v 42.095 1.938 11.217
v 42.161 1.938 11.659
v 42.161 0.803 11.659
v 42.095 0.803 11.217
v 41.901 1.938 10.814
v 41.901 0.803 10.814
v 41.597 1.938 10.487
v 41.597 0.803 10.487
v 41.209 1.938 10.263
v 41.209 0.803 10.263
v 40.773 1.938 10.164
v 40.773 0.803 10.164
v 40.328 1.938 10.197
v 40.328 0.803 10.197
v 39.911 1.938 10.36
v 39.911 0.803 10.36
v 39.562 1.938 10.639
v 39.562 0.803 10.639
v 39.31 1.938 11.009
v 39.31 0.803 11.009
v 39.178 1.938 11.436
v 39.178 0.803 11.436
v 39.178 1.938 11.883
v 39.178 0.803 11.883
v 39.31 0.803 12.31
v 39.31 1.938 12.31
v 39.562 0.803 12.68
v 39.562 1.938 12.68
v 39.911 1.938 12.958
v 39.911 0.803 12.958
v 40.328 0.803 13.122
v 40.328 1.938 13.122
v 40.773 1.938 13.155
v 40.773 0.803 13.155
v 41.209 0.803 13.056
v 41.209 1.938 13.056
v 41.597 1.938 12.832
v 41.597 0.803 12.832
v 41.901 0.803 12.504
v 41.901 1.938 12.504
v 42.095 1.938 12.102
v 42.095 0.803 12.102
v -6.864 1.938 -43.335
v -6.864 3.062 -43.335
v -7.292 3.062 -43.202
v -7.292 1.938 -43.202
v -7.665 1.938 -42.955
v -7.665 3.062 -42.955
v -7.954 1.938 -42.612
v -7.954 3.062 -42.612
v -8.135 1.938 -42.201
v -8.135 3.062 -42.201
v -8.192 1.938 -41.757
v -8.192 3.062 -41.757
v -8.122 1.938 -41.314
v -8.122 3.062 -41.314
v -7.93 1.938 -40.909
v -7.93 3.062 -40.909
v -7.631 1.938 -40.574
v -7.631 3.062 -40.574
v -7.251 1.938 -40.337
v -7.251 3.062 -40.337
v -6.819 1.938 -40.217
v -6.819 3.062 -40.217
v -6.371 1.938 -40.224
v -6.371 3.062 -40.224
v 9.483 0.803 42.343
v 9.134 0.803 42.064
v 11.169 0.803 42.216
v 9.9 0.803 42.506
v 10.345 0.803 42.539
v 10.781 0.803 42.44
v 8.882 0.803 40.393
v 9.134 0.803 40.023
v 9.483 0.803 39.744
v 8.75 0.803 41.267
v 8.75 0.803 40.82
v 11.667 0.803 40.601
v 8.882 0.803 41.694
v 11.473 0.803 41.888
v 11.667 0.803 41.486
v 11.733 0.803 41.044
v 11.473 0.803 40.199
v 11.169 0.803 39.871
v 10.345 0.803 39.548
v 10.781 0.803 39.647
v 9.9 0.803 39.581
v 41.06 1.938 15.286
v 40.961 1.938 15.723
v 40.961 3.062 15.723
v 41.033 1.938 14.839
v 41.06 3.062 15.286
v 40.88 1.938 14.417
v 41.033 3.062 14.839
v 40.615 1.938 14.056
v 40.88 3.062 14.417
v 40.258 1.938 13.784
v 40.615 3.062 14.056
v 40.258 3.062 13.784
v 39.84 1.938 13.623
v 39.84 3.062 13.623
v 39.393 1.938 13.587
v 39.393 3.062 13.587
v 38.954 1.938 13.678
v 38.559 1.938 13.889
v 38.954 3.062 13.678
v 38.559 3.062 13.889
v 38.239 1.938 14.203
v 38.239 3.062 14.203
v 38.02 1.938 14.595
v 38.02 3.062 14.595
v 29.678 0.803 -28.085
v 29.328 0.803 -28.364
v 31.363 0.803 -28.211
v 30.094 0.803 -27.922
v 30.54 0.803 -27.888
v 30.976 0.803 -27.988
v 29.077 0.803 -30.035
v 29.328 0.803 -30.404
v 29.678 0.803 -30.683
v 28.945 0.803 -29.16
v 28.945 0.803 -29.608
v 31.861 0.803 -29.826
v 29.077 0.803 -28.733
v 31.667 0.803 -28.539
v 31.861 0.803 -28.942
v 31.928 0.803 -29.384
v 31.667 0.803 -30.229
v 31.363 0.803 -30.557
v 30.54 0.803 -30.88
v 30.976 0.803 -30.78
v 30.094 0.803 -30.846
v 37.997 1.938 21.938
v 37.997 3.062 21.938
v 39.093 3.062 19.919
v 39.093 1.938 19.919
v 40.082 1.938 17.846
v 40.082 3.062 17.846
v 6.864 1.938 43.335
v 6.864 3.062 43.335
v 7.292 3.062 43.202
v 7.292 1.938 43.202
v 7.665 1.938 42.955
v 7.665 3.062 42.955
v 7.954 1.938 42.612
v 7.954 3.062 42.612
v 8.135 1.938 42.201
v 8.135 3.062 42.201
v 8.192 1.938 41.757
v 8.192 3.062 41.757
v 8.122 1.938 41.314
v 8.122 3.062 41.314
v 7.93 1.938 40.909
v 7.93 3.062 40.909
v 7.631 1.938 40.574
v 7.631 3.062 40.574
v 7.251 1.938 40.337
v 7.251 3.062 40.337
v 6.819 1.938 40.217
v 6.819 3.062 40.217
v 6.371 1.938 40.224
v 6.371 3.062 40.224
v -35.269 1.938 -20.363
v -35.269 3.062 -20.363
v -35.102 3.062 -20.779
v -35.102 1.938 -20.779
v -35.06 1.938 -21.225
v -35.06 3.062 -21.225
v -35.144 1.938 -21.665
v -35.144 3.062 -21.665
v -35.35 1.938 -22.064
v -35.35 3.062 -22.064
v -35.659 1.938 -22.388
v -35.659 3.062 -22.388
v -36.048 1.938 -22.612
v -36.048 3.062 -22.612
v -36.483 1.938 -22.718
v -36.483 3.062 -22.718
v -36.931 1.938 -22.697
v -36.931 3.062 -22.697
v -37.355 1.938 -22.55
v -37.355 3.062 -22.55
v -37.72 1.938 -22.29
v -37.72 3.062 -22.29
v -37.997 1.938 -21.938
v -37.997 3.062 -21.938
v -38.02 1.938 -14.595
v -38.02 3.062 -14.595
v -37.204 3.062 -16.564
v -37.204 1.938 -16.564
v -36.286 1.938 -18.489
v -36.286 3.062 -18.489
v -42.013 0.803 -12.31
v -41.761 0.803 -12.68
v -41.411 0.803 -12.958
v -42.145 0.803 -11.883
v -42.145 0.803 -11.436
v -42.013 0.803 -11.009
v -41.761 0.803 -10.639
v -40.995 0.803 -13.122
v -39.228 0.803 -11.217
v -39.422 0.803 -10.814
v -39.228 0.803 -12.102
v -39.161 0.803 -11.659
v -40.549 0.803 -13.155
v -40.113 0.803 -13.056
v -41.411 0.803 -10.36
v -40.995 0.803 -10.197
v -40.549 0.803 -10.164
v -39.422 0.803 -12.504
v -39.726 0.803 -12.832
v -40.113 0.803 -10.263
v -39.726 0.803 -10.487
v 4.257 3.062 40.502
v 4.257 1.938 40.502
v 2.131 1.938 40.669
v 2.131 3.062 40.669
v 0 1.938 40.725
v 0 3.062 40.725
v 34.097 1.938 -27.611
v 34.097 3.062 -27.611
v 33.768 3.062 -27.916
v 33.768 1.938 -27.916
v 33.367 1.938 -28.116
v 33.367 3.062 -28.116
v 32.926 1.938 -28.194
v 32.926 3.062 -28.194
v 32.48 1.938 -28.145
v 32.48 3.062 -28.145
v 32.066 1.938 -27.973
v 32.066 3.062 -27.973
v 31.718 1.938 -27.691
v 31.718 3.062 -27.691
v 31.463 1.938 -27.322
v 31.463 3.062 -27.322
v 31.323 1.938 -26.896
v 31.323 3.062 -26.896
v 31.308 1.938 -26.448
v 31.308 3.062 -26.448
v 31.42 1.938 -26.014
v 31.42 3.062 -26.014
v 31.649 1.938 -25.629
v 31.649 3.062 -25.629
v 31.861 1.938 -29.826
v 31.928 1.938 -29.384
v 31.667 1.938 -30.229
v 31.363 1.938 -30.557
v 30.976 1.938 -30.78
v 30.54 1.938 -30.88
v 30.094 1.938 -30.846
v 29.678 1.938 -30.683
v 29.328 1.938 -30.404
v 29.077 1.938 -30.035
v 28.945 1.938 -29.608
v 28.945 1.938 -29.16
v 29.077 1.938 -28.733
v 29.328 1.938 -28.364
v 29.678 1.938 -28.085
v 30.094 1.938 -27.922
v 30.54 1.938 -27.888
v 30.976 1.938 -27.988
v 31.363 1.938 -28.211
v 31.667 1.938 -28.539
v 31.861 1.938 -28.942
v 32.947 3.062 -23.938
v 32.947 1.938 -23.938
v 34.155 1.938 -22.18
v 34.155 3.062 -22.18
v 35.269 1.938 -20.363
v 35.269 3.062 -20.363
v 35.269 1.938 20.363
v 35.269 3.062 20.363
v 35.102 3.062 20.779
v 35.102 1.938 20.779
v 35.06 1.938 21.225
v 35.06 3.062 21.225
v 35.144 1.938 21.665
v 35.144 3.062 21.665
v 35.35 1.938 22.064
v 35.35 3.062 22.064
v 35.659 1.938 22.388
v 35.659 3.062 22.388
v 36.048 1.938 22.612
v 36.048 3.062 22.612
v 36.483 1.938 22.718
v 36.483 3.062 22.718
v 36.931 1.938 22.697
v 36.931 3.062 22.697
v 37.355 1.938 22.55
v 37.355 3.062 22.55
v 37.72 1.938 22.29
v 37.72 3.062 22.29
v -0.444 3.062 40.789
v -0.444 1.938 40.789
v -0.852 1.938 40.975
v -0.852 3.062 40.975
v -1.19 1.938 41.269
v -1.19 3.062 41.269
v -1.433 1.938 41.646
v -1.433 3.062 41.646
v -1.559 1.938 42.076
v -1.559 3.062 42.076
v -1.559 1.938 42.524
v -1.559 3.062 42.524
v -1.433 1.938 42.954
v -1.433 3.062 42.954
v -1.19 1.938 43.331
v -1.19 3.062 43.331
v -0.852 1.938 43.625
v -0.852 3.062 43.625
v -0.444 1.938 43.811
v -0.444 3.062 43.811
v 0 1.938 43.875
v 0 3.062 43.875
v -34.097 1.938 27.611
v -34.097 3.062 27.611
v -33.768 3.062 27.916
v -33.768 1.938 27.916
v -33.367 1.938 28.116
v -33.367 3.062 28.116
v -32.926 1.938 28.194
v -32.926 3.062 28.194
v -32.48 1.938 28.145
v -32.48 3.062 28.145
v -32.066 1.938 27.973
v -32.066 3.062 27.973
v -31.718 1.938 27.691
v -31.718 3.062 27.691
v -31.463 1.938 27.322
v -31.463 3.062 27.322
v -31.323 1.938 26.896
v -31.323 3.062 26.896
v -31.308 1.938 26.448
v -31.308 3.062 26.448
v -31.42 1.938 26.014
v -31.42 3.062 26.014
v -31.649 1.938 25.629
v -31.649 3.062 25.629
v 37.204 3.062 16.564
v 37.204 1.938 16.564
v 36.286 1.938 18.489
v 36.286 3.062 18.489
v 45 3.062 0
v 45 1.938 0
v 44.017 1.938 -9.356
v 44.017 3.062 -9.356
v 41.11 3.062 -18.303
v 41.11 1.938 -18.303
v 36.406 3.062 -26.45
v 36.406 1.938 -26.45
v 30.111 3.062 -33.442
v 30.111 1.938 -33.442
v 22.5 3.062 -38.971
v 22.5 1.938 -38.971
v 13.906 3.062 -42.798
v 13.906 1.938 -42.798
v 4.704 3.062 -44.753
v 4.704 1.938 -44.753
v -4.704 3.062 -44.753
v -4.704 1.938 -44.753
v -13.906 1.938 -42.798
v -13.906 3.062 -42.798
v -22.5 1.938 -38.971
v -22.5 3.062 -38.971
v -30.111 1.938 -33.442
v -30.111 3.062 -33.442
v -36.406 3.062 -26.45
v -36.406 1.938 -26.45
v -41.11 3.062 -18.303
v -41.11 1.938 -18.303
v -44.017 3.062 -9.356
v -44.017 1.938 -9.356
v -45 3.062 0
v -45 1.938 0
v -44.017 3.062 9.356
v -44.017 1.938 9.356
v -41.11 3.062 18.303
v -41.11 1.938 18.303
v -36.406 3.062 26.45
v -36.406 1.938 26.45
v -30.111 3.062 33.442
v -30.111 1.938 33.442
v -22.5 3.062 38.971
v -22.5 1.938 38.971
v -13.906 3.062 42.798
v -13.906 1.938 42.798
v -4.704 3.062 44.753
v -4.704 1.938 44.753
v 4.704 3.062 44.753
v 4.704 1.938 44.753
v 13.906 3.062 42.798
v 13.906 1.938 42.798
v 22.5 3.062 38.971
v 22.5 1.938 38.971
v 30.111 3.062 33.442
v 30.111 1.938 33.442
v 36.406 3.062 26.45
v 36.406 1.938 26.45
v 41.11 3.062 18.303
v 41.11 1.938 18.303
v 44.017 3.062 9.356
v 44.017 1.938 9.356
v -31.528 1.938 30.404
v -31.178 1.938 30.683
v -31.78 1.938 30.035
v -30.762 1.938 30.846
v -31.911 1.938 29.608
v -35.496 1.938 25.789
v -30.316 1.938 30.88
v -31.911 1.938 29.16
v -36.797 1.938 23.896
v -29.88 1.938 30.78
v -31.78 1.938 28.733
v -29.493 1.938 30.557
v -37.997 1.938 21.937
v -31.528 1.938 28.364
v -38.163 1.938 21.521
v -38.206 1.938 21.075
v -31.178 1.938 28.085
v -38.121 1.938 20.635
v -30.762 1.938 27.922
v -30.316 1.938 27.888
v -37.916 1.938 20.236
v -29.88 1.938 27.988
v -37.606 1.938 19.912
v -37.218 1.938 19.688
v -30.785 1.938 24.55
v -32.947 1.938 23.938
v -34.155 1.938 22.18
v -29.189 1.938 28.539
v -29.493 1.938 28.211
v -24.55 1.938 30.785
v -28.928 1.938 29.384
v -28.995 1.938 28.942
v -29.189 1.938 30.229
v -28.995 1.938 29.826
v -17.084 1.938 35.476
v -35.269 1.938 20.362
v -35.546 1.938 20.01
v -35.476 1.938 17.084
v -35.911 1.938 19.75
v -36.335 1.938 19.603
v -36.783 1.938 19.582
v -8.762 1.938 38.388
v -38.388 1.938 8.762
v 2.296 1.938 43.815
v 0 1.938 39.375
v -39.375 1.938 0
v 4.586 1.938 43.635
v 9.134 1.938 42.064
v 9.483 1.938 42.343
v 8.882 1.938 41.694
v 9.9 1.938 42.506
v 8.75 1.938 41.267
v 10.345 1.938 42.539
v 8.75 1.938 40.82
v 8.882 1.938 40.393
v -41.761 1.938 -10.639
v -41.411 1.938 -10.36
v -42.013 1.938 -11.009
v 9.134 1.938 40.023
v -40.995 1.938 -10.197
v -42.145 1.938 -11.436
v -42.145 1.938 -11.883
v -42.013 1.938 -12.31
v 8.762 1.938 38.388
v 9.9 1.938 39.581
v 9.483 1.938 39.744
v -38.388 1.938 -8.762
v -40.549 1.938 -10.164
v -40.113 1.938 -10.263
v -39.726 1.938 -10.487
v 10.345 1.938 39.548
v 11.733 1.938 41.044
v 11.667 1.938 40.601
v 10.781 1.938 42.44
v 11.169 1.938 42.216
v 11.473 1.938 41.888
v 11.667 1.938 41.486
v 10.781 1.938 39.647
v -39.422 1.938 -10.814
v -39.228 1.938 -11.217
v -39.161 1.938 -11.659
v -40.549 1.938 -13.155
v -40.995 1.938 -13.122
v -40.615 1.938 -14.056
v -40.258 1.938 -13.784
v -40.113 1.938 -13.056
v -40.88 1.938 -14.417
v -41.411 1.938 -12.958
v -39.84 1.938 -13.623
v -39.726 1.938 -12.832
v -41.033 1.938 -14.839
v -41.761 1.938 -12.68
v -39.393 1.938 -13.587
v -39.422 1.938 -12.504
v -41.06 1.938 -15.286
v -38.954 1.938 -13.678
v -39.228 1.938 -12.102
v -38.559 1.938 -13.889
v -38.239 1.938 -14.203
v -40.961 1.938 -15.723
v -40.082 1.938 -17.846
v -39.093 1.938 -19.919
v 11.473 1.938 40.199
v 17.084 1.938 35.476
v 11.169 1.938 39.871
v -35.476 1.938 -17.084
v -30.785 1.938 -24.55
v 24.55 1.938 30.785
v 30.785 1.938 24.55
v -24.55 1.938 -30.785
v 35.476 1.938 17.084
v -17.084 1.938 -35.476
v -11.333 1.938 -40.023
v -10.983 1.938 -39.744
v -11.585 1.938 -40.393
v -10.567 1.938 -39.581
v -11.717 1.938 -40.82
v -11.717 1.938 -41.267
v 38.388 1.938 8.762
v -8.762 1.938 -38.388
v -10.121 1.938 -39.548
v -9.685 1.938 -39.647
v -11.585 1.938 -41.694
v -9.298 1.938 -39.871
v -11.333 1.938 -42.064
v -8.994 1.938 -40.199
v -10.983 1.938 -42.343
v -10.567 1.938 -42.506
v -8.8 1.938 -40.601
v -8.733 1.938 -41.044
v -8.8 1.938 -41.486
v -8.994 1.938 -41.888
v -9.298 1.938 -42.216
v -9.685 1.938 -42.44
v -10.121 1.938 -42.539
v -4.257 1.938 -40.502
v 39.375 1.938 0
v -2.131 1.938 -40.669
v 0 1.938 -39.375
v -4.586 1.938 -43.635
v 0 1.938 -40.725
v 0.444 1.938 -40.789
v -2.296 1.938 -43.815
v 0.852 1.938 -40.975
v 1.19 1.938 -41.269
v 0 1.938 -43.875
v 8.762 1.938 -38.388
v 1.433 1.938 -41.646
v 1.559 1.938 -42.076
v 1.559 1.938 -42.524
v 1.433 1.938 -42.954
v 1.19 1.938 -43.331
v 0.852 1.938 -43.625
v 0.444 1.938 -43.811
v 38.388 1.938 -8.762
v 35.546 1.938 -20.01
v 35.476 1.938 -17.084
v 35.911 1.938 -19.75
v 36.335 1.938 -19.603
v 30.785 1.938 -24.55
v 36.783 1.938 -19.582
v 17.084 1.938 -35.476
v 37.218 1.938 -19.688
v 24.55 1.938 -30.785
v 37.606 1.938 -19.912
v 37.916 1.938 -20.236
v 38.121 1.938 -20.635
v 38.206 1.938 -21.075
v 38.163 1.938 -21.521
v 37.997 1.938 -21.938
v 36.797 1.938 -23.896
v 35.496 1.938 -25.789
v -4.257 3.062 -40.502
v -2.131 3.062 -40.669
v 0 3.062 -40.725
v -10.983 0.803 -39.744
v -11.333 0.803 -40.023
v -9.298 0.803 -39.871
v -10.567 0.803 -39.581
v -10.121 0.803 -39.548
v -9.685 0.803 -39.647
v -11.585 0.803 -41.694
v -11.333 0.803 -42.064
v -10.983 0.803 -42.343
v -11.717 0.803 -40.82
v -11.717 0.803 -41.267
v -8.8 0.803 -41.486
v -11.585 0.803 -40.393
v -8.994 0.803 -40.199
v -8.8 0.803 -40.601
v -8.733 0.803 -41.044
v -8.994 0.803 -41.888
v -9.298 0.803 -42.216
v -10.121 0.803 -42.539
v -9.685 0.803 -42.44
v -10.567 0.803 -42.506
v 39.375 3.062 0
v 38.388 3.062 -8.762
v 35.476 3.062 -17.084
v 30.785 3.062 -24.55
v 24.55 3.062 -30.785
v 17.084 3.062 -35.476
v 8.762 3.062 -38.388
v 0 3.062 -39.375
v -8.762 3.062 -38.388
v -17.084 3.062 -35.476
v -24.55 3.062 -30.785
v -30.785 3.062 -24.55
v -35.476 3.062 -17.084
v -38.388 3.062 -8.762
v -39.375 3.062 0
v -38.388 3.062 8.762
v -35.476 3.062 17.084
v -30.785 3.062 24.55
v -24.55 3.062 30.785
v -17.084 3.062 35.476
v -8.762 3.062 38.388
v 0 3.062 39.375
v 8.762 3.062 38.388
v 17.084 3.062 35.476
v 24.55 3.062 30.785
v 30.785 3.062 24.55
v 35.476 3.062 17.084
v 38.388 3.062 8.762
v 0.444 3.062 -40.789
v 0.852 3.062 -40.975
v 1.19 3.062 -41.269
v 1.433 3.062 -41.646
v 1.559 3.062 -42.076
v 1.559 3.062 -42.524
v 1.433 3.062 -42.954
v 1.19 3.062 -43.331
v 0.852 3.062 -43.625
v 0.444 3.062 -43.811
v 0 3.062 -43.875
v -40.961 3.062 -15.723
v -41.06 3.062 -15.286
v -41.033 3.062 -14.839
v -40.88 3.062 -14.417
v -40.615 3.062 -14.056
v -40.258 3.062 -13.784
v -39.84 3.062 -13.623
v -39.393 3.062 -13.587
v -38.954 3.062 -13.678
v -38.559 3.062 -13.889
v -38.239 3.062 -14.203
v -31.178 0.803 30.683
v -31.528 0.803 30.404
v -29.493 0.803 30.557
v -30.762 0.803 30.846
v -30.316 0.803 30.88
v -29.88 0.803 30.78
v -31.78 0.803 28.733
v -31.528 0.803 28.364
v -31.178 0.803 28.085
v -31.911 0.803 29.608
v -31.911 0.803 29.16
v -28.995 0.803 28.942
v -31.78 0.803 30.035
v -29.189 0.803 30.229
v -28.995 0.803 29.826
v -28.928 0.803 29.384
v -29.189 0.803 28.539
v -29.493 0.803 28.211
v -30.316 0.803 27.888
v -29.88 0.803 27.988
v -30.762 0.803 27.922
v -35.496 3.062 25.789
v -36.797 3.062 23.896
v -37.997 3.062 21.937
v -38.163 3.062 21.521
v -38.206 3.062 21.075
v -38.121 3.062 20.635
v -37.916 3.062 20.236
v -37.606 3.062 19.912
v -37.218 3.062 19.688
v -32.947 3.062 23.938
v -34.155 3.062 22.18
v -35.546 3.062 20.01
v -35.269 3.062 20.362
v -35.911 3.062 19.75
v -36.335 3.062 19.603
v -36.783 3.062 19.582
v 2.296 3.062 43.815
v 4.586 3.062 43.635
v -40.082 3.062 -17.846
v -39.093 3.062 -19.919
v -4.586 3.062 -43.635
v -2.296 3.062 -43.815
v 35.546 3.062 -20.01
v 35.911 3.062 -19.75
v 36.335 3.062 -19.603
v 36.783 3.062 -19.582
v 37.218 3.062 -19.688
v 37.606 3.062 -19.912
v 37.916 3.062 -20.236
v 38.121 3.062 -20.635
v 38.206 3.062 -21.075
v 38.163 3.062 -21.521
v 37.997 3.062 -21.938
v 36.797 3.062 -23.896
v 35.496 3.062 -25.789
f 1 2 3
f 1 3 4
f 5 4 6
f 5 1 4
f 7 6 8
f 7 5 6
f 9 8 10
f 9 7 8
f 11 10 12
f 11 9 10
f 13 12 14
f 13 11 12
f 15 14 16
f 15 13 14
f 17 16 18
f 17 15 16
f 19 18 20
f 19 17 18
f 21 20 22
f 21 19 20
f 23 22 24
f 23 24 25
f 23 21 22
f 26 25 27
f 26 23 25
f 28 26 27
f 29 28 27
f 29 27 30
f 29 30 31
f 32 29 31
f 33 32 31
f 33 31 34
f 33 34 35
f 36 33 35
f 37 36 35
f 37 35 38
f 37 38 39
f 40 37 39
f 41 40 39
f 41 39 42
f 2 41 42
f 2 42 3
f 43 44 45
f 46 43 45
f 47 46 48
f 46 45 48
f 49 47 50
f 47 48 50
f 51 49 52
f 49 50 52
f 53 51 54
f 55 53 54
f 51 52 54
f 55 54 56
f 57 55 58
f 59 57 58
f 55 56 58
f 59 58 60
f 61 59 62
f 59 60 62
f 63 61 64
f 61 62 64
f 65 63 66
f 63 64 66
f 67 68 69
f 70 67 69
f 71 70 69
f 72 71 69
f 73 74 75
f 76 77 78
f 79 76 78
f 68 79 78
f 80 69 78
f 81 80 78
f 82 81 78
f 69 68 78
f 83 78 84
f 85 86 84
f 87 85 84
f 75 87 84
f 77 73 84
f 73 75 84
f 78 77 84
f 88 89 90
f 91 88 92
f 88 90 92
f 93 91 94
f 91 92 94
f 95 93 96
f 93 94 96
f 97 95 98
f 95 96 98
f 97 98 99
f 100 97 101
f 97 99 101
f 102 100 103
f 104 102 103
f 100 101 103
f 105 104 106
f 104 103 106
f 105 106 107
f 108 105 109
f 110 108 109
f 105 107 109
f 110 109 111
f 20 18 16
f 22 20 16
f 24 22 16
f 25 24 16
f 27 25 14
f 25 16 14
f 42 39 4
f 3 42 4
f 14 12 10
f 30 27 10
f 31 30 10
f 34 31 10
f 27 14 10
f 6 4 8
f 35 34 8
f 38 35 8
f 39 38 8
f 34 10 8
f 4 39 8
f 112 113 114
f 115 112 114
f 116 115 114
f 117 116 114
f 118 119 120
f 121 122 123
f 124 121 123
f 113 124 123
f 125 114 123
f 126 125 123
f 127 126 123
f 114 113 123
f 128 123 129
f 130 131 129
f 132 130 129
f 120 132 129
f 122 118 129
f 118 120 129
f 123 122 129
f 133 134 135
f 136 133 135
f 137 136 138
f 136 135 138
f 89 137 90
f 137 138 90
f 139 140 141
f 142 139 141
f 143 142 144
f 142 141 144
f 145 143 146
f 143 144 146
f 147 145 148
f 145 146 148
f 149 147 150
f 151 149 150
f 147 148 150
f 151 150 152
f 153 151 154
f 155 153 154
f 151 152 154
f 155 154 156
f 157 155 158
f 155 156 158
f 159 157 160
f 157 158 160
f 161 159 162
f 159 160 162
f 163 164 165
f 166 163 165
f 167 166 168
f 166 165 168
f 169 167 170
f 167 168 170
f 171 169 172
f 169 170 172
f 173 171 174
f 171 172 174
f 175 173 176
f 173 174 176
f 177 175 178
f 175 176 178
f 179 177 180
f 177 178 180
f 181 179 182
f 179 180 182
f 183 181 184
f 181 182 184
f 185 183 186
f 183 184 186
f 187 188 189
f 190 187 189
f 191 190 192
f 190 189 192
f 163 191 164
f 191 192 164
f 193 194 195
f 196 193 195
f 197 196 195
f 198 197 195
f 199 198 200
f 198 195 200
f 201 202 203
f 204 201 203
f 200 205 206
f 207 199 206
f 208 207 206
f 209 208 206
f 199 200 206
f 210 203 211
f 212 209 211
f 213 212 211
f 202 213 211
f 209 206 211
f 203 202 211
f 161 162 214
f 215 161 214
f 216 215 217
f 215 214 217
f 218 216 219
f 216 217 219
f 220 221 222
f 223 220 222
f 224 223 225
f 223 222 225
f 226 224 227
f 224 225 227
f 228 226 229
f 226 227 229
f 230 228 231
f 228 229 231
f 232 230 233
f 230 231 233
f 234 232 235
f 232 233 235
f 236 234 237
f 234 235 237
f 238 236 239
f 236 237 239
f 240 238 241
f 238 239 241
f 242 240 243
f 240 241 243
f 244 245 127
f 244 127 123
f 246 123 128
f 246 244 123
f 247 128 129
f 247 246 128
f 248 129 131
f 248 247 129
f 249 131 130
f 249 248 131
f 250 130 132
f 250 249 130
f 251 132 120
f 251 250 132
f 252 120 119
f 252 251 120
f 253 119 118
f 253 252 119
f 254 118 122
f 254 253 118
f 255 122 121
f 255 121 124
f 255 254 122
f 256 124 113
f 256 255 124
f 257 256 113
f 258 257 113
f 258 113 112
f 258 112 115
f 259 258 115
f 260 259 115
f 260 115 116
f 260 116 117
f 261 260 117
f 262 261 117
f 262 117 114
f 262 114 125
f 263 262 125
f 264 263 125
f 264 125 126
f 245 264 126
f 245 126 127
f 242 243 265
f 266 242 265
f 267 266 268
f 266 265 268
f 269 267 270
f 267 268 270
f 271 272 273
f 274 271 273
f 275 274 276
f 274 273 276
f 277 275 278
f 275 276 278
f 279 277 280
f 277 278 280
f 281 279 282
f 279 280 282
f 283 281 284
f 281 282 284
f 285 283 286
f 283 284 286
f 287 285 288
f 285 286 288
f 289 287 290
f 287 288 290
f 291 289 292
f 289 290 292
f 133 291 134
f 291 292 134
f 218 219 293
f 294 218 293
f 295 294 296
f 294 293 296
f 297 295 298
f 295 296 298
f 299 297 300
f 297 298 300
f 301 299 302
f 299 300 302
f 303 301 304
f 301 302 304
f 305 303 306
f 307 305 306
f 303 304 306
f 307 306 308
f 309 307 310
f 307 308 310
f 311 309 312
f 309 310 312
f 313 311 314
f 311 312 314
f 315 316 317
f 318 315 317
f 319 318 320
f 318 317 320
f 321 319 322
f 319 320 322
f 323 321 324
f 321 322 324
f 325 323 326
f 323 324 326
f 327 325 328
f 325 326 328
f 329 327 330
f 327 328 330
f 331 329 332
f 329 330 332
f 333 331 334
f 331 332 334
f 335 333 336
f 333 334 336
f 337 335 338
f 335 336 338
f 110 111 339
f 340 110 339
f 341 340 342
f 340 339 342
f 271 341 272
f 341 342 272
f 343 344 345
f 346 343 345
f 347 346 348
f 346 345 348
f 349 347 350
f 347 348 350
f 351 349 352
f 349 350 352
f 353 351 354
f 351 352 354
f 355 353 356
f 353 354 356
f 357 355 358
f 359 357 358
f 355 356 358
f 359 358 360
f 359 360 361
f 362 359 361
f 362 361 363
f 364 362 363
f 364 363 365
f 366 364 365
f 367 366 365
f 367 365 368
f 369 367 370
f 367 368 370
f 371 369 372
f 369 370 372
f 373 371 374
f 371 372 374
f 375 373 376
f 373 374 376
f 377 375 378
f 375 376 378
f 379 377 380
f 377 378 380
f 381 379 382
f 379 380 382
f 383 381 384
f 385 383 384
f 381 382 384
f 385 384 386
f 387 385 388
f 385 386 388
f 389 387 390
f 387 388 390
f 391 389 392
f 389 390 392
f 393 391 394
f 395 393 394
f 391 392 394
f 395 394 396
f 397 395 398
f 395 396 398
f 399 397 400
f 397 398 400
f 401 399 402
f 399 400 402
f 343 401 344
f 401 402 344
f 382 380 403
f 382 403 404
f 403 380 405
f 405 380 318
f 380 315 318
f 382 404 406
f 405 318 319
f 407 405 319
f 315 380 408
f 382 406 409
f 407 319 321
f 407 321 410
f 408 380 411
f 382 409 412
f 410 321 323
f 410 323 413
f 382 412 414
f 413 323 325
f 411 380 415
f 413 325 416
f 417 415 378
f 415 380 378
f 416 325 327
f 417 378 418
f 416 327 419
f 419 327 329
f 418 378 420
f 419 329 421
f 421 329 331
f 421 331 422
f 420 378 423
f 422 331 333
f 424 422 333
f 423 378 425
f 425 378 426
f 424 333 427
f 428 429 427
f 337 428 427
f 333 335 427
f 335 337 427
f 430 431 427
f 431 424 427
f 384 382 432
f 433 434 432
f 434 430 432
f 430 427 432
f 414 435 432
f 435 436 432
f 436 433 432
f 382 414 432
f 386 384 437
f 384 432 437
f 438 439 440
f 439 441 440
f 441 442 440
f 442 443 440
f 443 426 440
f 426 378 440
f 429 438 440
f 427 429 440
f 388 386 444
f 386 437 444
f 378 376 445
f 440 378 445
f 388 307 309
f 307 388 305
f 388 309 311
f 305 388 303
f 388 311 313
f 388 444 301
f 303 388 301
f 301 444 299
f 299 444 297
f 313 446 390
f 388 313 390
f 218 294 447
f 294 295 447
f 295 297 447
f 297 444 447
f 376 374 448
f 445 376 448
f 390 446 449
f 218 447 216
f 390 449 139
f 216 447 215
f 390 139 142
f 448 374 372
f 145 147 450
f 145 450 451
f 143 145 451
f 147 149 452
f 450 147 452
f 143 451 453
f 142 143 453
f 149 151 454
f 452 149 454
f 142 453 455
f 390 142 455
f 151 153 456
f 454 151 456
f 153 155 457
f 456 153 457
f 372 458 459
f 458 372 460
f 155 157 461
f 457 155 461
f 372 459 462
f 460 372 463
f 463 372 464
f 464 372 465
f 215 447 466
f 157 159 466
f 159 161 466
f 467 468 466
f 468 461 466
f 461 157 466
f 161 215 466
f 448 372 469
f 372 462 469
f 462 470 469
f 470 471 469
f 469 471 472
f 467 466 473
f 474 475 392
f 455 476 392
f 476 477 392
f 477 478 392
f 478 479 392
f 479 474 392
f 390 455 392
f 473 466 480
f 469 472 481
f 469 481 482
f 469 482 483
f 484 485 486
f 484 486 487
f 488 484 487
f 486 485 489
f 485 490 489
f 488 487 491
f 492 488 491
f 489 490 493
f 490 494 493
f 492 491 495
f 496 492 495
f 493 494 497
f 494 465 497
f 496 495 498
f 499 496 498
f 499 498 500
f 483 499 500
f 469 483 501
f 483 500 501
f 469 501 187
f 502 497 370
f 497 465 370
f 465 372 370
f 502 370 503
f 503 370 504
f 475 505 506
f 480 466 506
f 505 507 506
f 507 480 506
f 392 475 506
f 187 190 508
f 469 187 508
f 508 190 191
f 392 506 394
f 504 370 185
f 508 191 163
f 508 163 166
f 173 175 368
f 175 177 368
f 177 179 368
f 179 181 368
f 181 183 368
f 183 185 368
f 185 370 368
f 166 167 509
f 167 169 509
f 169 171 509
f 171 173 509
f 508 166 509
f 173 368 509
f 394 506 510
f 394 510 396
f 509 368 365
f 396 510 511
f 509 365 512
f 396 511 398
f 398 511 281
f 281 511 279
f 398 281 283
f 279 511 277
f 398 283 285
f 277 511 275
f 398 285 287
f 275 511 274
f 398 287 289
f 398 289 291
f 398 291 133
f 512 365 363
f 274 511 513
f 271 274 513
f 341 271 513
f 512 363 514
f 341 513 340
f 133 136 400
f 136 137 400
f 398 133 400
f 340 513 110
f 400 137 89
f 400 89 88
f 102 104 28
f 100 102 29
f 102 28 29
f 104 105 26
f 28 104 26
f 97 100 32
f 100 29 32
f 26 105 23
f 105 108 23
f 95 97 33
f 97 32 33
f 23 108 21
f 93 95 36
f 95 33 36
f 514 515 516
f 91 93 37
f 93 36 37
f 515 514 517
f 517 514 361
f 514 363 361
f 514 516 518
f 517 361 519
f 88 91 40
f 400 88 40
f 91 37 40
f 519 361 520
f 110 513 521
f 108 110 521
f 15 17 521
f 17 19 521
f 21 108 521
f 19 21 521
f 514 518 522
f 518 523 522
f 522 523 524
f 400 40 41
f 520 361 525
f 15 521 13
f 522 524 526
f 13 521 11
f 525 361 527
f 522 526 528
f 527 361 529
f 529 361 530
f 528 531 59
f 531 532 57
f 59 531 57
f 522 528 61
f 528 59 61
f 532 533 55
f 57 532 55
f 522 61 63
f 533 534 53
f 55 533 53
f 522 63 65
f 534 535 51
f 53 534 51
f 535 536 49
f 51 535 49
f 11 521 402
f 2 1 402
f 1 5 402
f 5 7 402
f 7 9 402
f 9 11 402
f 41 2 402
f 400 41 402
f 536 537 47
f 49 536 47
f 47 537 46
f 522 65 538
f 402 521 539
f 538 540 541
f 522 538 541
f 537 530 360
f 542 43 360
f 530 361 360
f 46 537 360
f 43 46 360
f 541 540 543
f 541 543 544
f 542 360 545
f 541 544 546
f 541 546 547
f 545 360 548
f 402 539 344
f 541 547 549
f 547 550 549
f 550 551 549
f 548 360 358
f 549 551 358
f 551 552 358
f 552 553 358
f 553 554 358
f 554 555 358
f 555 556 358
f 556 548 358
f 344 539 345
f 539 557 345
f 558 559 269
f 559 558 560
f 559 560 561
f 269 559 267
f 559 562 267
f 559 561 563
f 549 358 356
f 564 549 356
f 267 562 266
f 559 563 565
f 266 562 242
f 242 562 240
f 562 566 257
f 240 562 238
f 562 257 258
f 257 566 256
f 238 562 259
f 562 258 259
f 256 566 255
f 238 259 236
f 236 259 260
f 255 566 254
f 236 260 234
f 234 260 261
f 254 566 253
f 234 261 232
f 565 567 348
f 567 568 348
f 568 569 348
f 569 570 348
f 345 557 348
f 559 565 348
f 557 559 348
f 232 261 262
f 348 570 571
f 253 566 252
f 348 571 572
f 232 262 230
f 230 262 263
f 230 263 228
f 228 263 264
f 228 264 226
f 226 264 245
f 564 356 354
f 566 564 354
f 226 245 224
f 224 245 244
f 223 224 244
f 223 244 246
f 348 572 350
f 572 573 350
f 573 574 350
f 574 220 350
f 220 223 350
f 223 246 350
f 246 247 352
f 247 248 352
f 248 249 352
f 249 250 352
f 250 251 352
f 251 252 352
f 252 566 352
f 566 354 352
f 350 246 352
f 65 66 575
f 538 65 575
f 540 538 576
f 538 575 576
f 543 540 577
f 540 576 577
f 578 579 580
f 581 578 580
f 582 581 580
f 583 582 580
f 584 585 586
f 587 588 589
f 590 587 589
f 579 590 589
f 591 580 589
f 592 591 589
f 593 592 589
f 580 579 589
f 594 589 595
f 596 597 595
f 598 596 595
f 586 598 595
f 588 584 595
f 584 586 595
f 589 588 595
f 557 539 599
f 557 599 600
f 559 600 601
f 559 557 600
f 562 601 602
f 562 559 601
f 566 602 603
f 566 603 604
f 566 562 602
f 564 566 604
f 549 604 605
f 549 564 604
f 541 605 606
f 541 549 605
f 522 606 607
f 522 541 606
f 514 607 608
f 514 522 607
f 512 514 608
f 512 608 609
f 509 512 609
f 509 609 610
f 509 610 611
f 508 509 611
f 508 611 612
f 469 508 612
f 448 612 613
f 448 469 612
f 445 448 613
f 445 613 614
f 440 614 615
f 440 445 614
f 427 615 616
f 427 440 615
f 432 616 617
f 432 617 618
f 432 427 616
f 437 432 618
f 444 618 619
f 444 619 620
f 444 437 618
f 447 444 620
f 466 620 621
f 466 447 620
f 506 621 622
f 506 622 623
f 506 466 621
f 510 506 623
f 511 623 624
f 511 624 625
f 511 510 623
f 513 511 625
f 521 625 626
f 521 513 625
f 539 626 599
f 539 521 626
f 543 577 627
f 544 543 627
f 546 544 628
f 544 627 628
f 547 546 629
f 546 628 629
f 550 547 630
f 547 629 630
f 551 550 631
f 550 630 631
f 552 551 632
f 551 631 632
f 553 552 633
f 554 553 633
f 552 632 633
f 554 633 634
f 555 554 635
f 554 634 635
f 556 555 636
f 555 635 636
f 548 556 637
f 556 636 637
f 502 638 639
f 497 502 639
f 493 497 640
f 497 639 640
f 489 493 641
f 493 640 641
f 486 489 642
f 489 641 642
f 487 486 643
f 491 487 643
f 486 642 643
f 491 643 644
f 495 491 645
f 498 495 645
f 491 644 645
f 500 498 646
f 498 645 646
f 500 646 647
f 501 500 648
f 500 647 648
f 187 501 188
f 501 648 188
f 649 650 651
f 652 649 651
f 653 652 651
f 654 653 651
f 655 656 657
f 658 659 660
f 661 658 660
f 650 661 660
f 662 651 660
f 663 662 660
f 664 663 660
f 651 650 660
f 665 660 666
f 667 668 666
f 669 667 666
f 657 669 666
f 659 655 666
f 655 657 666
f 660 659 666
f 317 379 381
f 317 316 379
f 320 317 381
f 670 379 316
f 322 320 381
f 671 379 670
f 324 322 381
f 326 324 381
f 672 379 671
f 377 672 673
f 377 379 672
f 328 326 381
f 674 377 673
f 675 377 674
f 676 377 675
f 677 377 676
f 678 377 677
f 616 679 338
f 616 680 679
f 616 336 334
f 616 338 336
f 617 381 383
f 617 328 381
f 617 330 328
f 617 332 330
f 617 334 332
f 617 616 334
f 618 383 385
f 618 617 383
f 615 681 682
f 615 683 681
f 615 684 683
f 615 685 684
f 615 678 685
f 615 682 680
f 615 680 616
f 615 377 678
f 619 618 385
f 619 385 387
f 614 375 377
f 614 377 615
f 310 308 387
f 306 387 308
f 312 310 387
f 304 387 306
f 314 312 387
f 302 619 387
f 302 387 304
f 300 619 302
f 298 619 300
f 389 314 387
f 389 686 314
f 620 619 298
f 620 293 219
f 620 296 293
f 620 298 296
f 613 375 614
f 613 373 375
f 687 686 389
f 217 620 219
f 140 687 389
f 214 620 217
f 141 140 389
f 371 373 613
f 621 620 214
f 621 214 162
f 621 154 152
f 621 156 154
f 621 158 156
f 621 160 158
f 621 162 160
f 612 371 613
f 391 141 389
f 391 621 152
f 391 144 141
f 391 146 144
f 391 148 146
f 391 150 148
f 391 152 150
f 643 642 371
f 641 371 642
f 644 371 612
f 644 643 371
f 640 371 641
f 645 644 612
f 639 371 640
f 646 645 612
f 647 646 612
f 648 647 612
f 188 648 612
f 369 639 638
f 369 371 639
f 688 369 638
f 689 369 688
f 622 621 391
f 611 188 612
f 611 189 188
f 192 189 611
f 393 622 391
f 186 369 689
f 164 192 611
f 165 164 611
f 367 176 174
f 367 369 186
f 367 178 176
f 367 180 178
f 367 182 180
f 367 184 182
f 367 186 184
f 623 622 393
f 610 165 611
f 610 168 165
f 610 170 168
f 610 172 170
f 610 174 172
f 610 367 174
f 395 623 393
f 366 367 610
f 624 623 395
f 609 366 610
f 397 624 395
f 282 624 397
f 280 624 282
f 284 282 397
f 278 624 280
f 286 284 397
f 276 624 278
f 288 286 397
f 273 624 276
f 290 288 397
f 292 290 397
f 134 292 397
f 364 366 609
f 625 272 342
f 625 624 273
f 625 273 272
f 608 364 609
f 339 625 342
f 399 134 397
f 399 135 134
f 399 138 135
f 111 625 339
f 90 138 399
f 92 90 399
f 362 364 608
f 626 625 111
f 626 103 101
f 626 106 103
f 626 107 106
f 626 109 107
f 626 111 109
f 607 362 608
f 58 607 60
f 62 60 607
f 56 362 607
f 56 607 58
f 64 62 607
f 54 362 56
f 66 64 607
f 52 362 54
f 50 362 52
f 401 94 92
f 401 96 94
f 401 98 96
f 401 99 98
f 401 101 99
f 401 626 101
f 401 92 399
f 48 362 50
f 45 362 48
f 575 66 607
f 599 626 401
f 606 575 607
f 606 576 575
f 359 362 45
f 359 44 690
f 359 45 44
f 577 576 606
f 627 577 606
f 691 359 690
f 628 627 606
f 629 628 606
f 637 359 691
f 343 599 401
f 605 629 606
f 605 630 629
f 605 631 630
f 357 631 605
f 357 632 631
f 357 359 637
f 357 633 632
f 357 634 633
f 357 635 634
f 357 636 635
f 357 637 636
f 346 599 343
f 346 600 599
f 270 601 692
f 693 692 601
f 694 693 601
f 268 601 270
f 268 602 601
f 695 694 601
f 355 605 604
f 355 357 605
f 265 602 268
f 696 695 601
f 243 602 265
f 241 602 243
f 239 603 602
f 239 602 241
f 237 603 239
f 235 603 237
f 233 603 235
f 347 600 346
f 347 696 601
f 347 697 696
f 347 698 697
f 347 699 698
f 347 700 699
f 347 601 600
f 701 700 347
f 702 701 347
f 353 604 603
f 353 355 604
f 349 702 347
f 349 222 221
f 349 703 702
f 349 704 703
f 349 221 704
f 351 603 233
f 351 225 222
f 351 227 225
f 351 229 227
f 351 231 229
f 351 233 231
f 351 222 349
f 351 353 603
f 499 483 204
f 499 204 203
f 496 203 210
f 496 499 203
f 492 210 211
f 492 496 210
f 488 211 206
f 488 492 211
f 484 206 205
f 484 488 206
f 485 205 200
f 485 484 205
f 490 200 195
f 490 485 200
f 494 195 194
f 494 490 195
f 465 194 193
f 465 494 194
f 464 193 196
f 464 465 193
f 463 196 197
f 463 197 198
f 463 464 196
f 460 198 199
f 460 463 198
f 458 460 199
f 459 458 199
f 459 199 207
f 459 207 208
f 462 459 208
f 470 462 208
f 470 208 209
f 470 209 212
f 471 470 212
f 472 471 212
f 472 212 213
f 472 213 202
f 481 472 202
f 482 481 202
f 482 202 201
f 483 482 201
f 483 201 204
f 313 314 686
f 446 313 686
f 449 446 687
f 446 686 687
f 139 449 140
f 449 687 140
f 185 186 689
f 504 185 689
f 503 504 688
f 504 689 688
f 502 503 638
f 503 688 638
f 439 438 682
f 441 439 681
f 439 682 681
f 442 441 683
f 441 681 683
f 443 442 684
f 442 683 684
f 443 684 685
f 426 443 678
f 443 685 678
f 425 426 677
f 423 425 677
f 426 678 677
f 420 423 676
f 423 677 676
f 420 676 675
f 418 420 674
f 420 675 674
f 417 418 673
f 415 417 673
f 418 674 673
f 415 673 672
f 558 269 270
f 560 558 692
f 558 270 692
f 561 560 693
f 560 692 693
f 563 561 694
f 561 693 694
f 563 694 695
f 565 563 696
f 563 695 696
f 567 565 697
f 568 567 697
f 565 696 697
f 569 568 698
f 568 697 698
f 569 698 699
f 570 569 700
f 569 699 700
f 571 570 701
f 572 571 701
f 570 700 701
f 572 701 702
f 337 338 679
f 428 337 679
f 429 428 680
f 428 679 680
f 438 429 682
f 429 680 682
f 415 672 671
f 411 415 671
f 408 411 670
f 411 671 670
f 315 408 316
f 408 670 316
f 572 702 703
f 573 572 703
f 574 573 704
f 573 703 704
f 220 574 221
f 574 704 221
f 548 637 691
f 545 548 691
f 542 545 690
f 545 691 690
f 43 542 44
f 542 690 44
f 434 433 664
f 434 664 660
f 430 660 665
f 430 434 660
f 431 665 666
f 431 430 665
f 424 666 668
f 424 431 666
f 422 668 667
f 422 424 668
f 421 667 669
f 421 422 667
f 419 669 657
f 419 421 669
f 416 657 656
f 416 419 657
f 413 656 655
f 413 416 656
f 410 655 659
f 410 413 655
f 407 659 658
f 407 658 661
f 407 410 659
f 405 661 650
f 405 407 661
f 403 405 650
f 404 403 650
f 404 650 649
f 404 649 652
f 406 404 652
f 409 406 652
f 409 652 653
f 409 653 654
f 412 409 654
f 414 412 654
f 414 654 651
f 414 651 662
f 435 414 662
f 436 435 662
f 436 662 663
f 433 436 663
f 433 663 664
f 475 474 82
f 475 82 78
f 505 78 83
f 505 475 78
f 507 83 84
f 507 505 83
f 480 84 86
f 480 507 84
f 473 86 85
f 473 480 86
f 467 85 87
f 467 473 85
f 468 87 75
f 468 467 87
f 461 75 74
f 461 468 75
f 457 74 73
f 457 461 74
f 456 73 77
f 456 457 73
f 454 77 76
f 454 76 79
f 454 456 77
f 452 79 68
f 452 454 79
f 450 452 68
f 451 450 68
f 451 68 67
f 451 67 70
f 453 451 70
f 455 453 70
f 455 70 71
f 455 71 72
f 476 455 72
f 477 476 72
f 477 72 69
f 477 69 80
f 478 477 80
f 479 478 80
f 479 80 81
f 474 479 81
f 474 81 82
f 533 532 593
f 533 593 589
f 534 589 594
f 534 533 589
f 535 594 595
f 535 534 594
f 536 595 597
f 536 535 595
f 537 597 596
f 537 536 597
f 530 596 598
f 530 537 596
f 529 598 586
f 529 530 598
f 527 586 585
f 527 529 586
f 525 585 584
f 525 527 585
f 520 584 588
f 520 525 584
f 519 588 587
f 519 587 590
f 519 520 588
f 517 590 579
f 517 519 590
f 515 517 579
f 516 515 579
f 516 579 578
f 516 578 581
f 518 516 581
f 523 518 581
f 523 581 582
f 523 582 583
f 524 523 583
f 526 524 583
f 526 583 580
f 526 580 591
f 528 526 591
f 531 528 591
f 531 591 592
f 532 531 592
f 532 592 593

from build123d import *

# Parameters (mm, degrees)
SKETCH1_R           = 200
SKETCH1_R_2         = 175
BOSS_EXTRUDE1_DEPTH = 5
SKETCH2_R           = 2
CUT_EXTRUDE1_DEPTH  = 21
CIRPATTERN1_COUNT   = 6
SCALE1_SCALE        = 0.225
SKETCH3_R           = 1.5
BOSS_EXTRUDE2_DEPTH = 2.26


with BuildPart() as part:
    # Sketch1 → Boss-Extrude1 (new body)
    with BuildSketch(Plane(origin=(0, 0, 0), x_dir=(1, 0, 0), z_dir=(0, 1, 0))):
        Circle(SKETCH1_R)
        Circle(SKETCH1_R_2, mode=Mode.SUBTRACT)
    extrude(amount=BOSS_EXTRUDE1_DEPTH)

    # Sketch2 → Cut-Extrude1 (cut)
    with BuildSketch(Plane(origin=(0, 5, 0), x_dir=(1, 0, 0), z_dir=(0, 1, 0))):
        with Locations((-45.481316373, 182.41559654)):
            Circle(SKETCH2_R)
        with BuildLine():
            ThreePointArc((0, 195), (-15.299523667, 194.398880078), (-30.504720683, 192.599226416))
            ThreePointArc((-30.504720683, 192.599226416), (-36.323497812, 184.590366777), (-28.314638172, 178.771589648))
            ThreePointArc((-28.314638172, 178.771589648), (-14.201096327, 180.442037406), (0, 181))
            ThreePointArc((0, 181), (7, 188), (0, 195))
        make_face()
    cut_extrude1 = extrude(amount=-CUT_EXTRUDE1_DEPTH, mode=Mode.SUBTRACT)

    # CirPattern1: Cut-Extrude1 ×6 about axis
    cirpattern1_axis = Axis((0, 0, 0), (0, 1, 0))
    for i in range(1, CIRPATTERN1_COUNT):
        add(cut_extrude1.rotate(cirpattern1_axis, i * 360 / CIRPATTERN1_COUNT), mode=Mode.SUBTRACT)


with BuildPart() as part_1:
    # Scale1: scaled about (0, 2.5, 0)
    add(part.part.scale(SCALE1_SCALE).moved(Location((0, 1.9375, 0))))

    # Sketch3 → Boss-Extrude2 (add)
    with BuildSketch(Plane(origin=(0, 3.0625, 0), x_dir=(1, 0, 0), z_dir=(0, 1, 0))):
        with Locations((-10.233296184, 41.043509221)):
            Circle(SKETCH3_R)
        with Locations((30.428073554, 29.38404907)):
            Circle(SKETCH3_R)
        with Locations((40.661369738, -11.659460151)):
            Circle(SKETCH3_R)
        with Locations((10.233296184, -41.043509221)):
            Circle(SKETCH3_R)
        with Locations((-30.428073554, -29.38404907)):
            Circle(SKETCH3_R)
        with Locations((-40.661369738, 11.659460151)):
            Circle(SKETCH3_R)
    extrude(amount=-BOSS_EXTRUDE2_DEPTH)


solid = part_1.part
